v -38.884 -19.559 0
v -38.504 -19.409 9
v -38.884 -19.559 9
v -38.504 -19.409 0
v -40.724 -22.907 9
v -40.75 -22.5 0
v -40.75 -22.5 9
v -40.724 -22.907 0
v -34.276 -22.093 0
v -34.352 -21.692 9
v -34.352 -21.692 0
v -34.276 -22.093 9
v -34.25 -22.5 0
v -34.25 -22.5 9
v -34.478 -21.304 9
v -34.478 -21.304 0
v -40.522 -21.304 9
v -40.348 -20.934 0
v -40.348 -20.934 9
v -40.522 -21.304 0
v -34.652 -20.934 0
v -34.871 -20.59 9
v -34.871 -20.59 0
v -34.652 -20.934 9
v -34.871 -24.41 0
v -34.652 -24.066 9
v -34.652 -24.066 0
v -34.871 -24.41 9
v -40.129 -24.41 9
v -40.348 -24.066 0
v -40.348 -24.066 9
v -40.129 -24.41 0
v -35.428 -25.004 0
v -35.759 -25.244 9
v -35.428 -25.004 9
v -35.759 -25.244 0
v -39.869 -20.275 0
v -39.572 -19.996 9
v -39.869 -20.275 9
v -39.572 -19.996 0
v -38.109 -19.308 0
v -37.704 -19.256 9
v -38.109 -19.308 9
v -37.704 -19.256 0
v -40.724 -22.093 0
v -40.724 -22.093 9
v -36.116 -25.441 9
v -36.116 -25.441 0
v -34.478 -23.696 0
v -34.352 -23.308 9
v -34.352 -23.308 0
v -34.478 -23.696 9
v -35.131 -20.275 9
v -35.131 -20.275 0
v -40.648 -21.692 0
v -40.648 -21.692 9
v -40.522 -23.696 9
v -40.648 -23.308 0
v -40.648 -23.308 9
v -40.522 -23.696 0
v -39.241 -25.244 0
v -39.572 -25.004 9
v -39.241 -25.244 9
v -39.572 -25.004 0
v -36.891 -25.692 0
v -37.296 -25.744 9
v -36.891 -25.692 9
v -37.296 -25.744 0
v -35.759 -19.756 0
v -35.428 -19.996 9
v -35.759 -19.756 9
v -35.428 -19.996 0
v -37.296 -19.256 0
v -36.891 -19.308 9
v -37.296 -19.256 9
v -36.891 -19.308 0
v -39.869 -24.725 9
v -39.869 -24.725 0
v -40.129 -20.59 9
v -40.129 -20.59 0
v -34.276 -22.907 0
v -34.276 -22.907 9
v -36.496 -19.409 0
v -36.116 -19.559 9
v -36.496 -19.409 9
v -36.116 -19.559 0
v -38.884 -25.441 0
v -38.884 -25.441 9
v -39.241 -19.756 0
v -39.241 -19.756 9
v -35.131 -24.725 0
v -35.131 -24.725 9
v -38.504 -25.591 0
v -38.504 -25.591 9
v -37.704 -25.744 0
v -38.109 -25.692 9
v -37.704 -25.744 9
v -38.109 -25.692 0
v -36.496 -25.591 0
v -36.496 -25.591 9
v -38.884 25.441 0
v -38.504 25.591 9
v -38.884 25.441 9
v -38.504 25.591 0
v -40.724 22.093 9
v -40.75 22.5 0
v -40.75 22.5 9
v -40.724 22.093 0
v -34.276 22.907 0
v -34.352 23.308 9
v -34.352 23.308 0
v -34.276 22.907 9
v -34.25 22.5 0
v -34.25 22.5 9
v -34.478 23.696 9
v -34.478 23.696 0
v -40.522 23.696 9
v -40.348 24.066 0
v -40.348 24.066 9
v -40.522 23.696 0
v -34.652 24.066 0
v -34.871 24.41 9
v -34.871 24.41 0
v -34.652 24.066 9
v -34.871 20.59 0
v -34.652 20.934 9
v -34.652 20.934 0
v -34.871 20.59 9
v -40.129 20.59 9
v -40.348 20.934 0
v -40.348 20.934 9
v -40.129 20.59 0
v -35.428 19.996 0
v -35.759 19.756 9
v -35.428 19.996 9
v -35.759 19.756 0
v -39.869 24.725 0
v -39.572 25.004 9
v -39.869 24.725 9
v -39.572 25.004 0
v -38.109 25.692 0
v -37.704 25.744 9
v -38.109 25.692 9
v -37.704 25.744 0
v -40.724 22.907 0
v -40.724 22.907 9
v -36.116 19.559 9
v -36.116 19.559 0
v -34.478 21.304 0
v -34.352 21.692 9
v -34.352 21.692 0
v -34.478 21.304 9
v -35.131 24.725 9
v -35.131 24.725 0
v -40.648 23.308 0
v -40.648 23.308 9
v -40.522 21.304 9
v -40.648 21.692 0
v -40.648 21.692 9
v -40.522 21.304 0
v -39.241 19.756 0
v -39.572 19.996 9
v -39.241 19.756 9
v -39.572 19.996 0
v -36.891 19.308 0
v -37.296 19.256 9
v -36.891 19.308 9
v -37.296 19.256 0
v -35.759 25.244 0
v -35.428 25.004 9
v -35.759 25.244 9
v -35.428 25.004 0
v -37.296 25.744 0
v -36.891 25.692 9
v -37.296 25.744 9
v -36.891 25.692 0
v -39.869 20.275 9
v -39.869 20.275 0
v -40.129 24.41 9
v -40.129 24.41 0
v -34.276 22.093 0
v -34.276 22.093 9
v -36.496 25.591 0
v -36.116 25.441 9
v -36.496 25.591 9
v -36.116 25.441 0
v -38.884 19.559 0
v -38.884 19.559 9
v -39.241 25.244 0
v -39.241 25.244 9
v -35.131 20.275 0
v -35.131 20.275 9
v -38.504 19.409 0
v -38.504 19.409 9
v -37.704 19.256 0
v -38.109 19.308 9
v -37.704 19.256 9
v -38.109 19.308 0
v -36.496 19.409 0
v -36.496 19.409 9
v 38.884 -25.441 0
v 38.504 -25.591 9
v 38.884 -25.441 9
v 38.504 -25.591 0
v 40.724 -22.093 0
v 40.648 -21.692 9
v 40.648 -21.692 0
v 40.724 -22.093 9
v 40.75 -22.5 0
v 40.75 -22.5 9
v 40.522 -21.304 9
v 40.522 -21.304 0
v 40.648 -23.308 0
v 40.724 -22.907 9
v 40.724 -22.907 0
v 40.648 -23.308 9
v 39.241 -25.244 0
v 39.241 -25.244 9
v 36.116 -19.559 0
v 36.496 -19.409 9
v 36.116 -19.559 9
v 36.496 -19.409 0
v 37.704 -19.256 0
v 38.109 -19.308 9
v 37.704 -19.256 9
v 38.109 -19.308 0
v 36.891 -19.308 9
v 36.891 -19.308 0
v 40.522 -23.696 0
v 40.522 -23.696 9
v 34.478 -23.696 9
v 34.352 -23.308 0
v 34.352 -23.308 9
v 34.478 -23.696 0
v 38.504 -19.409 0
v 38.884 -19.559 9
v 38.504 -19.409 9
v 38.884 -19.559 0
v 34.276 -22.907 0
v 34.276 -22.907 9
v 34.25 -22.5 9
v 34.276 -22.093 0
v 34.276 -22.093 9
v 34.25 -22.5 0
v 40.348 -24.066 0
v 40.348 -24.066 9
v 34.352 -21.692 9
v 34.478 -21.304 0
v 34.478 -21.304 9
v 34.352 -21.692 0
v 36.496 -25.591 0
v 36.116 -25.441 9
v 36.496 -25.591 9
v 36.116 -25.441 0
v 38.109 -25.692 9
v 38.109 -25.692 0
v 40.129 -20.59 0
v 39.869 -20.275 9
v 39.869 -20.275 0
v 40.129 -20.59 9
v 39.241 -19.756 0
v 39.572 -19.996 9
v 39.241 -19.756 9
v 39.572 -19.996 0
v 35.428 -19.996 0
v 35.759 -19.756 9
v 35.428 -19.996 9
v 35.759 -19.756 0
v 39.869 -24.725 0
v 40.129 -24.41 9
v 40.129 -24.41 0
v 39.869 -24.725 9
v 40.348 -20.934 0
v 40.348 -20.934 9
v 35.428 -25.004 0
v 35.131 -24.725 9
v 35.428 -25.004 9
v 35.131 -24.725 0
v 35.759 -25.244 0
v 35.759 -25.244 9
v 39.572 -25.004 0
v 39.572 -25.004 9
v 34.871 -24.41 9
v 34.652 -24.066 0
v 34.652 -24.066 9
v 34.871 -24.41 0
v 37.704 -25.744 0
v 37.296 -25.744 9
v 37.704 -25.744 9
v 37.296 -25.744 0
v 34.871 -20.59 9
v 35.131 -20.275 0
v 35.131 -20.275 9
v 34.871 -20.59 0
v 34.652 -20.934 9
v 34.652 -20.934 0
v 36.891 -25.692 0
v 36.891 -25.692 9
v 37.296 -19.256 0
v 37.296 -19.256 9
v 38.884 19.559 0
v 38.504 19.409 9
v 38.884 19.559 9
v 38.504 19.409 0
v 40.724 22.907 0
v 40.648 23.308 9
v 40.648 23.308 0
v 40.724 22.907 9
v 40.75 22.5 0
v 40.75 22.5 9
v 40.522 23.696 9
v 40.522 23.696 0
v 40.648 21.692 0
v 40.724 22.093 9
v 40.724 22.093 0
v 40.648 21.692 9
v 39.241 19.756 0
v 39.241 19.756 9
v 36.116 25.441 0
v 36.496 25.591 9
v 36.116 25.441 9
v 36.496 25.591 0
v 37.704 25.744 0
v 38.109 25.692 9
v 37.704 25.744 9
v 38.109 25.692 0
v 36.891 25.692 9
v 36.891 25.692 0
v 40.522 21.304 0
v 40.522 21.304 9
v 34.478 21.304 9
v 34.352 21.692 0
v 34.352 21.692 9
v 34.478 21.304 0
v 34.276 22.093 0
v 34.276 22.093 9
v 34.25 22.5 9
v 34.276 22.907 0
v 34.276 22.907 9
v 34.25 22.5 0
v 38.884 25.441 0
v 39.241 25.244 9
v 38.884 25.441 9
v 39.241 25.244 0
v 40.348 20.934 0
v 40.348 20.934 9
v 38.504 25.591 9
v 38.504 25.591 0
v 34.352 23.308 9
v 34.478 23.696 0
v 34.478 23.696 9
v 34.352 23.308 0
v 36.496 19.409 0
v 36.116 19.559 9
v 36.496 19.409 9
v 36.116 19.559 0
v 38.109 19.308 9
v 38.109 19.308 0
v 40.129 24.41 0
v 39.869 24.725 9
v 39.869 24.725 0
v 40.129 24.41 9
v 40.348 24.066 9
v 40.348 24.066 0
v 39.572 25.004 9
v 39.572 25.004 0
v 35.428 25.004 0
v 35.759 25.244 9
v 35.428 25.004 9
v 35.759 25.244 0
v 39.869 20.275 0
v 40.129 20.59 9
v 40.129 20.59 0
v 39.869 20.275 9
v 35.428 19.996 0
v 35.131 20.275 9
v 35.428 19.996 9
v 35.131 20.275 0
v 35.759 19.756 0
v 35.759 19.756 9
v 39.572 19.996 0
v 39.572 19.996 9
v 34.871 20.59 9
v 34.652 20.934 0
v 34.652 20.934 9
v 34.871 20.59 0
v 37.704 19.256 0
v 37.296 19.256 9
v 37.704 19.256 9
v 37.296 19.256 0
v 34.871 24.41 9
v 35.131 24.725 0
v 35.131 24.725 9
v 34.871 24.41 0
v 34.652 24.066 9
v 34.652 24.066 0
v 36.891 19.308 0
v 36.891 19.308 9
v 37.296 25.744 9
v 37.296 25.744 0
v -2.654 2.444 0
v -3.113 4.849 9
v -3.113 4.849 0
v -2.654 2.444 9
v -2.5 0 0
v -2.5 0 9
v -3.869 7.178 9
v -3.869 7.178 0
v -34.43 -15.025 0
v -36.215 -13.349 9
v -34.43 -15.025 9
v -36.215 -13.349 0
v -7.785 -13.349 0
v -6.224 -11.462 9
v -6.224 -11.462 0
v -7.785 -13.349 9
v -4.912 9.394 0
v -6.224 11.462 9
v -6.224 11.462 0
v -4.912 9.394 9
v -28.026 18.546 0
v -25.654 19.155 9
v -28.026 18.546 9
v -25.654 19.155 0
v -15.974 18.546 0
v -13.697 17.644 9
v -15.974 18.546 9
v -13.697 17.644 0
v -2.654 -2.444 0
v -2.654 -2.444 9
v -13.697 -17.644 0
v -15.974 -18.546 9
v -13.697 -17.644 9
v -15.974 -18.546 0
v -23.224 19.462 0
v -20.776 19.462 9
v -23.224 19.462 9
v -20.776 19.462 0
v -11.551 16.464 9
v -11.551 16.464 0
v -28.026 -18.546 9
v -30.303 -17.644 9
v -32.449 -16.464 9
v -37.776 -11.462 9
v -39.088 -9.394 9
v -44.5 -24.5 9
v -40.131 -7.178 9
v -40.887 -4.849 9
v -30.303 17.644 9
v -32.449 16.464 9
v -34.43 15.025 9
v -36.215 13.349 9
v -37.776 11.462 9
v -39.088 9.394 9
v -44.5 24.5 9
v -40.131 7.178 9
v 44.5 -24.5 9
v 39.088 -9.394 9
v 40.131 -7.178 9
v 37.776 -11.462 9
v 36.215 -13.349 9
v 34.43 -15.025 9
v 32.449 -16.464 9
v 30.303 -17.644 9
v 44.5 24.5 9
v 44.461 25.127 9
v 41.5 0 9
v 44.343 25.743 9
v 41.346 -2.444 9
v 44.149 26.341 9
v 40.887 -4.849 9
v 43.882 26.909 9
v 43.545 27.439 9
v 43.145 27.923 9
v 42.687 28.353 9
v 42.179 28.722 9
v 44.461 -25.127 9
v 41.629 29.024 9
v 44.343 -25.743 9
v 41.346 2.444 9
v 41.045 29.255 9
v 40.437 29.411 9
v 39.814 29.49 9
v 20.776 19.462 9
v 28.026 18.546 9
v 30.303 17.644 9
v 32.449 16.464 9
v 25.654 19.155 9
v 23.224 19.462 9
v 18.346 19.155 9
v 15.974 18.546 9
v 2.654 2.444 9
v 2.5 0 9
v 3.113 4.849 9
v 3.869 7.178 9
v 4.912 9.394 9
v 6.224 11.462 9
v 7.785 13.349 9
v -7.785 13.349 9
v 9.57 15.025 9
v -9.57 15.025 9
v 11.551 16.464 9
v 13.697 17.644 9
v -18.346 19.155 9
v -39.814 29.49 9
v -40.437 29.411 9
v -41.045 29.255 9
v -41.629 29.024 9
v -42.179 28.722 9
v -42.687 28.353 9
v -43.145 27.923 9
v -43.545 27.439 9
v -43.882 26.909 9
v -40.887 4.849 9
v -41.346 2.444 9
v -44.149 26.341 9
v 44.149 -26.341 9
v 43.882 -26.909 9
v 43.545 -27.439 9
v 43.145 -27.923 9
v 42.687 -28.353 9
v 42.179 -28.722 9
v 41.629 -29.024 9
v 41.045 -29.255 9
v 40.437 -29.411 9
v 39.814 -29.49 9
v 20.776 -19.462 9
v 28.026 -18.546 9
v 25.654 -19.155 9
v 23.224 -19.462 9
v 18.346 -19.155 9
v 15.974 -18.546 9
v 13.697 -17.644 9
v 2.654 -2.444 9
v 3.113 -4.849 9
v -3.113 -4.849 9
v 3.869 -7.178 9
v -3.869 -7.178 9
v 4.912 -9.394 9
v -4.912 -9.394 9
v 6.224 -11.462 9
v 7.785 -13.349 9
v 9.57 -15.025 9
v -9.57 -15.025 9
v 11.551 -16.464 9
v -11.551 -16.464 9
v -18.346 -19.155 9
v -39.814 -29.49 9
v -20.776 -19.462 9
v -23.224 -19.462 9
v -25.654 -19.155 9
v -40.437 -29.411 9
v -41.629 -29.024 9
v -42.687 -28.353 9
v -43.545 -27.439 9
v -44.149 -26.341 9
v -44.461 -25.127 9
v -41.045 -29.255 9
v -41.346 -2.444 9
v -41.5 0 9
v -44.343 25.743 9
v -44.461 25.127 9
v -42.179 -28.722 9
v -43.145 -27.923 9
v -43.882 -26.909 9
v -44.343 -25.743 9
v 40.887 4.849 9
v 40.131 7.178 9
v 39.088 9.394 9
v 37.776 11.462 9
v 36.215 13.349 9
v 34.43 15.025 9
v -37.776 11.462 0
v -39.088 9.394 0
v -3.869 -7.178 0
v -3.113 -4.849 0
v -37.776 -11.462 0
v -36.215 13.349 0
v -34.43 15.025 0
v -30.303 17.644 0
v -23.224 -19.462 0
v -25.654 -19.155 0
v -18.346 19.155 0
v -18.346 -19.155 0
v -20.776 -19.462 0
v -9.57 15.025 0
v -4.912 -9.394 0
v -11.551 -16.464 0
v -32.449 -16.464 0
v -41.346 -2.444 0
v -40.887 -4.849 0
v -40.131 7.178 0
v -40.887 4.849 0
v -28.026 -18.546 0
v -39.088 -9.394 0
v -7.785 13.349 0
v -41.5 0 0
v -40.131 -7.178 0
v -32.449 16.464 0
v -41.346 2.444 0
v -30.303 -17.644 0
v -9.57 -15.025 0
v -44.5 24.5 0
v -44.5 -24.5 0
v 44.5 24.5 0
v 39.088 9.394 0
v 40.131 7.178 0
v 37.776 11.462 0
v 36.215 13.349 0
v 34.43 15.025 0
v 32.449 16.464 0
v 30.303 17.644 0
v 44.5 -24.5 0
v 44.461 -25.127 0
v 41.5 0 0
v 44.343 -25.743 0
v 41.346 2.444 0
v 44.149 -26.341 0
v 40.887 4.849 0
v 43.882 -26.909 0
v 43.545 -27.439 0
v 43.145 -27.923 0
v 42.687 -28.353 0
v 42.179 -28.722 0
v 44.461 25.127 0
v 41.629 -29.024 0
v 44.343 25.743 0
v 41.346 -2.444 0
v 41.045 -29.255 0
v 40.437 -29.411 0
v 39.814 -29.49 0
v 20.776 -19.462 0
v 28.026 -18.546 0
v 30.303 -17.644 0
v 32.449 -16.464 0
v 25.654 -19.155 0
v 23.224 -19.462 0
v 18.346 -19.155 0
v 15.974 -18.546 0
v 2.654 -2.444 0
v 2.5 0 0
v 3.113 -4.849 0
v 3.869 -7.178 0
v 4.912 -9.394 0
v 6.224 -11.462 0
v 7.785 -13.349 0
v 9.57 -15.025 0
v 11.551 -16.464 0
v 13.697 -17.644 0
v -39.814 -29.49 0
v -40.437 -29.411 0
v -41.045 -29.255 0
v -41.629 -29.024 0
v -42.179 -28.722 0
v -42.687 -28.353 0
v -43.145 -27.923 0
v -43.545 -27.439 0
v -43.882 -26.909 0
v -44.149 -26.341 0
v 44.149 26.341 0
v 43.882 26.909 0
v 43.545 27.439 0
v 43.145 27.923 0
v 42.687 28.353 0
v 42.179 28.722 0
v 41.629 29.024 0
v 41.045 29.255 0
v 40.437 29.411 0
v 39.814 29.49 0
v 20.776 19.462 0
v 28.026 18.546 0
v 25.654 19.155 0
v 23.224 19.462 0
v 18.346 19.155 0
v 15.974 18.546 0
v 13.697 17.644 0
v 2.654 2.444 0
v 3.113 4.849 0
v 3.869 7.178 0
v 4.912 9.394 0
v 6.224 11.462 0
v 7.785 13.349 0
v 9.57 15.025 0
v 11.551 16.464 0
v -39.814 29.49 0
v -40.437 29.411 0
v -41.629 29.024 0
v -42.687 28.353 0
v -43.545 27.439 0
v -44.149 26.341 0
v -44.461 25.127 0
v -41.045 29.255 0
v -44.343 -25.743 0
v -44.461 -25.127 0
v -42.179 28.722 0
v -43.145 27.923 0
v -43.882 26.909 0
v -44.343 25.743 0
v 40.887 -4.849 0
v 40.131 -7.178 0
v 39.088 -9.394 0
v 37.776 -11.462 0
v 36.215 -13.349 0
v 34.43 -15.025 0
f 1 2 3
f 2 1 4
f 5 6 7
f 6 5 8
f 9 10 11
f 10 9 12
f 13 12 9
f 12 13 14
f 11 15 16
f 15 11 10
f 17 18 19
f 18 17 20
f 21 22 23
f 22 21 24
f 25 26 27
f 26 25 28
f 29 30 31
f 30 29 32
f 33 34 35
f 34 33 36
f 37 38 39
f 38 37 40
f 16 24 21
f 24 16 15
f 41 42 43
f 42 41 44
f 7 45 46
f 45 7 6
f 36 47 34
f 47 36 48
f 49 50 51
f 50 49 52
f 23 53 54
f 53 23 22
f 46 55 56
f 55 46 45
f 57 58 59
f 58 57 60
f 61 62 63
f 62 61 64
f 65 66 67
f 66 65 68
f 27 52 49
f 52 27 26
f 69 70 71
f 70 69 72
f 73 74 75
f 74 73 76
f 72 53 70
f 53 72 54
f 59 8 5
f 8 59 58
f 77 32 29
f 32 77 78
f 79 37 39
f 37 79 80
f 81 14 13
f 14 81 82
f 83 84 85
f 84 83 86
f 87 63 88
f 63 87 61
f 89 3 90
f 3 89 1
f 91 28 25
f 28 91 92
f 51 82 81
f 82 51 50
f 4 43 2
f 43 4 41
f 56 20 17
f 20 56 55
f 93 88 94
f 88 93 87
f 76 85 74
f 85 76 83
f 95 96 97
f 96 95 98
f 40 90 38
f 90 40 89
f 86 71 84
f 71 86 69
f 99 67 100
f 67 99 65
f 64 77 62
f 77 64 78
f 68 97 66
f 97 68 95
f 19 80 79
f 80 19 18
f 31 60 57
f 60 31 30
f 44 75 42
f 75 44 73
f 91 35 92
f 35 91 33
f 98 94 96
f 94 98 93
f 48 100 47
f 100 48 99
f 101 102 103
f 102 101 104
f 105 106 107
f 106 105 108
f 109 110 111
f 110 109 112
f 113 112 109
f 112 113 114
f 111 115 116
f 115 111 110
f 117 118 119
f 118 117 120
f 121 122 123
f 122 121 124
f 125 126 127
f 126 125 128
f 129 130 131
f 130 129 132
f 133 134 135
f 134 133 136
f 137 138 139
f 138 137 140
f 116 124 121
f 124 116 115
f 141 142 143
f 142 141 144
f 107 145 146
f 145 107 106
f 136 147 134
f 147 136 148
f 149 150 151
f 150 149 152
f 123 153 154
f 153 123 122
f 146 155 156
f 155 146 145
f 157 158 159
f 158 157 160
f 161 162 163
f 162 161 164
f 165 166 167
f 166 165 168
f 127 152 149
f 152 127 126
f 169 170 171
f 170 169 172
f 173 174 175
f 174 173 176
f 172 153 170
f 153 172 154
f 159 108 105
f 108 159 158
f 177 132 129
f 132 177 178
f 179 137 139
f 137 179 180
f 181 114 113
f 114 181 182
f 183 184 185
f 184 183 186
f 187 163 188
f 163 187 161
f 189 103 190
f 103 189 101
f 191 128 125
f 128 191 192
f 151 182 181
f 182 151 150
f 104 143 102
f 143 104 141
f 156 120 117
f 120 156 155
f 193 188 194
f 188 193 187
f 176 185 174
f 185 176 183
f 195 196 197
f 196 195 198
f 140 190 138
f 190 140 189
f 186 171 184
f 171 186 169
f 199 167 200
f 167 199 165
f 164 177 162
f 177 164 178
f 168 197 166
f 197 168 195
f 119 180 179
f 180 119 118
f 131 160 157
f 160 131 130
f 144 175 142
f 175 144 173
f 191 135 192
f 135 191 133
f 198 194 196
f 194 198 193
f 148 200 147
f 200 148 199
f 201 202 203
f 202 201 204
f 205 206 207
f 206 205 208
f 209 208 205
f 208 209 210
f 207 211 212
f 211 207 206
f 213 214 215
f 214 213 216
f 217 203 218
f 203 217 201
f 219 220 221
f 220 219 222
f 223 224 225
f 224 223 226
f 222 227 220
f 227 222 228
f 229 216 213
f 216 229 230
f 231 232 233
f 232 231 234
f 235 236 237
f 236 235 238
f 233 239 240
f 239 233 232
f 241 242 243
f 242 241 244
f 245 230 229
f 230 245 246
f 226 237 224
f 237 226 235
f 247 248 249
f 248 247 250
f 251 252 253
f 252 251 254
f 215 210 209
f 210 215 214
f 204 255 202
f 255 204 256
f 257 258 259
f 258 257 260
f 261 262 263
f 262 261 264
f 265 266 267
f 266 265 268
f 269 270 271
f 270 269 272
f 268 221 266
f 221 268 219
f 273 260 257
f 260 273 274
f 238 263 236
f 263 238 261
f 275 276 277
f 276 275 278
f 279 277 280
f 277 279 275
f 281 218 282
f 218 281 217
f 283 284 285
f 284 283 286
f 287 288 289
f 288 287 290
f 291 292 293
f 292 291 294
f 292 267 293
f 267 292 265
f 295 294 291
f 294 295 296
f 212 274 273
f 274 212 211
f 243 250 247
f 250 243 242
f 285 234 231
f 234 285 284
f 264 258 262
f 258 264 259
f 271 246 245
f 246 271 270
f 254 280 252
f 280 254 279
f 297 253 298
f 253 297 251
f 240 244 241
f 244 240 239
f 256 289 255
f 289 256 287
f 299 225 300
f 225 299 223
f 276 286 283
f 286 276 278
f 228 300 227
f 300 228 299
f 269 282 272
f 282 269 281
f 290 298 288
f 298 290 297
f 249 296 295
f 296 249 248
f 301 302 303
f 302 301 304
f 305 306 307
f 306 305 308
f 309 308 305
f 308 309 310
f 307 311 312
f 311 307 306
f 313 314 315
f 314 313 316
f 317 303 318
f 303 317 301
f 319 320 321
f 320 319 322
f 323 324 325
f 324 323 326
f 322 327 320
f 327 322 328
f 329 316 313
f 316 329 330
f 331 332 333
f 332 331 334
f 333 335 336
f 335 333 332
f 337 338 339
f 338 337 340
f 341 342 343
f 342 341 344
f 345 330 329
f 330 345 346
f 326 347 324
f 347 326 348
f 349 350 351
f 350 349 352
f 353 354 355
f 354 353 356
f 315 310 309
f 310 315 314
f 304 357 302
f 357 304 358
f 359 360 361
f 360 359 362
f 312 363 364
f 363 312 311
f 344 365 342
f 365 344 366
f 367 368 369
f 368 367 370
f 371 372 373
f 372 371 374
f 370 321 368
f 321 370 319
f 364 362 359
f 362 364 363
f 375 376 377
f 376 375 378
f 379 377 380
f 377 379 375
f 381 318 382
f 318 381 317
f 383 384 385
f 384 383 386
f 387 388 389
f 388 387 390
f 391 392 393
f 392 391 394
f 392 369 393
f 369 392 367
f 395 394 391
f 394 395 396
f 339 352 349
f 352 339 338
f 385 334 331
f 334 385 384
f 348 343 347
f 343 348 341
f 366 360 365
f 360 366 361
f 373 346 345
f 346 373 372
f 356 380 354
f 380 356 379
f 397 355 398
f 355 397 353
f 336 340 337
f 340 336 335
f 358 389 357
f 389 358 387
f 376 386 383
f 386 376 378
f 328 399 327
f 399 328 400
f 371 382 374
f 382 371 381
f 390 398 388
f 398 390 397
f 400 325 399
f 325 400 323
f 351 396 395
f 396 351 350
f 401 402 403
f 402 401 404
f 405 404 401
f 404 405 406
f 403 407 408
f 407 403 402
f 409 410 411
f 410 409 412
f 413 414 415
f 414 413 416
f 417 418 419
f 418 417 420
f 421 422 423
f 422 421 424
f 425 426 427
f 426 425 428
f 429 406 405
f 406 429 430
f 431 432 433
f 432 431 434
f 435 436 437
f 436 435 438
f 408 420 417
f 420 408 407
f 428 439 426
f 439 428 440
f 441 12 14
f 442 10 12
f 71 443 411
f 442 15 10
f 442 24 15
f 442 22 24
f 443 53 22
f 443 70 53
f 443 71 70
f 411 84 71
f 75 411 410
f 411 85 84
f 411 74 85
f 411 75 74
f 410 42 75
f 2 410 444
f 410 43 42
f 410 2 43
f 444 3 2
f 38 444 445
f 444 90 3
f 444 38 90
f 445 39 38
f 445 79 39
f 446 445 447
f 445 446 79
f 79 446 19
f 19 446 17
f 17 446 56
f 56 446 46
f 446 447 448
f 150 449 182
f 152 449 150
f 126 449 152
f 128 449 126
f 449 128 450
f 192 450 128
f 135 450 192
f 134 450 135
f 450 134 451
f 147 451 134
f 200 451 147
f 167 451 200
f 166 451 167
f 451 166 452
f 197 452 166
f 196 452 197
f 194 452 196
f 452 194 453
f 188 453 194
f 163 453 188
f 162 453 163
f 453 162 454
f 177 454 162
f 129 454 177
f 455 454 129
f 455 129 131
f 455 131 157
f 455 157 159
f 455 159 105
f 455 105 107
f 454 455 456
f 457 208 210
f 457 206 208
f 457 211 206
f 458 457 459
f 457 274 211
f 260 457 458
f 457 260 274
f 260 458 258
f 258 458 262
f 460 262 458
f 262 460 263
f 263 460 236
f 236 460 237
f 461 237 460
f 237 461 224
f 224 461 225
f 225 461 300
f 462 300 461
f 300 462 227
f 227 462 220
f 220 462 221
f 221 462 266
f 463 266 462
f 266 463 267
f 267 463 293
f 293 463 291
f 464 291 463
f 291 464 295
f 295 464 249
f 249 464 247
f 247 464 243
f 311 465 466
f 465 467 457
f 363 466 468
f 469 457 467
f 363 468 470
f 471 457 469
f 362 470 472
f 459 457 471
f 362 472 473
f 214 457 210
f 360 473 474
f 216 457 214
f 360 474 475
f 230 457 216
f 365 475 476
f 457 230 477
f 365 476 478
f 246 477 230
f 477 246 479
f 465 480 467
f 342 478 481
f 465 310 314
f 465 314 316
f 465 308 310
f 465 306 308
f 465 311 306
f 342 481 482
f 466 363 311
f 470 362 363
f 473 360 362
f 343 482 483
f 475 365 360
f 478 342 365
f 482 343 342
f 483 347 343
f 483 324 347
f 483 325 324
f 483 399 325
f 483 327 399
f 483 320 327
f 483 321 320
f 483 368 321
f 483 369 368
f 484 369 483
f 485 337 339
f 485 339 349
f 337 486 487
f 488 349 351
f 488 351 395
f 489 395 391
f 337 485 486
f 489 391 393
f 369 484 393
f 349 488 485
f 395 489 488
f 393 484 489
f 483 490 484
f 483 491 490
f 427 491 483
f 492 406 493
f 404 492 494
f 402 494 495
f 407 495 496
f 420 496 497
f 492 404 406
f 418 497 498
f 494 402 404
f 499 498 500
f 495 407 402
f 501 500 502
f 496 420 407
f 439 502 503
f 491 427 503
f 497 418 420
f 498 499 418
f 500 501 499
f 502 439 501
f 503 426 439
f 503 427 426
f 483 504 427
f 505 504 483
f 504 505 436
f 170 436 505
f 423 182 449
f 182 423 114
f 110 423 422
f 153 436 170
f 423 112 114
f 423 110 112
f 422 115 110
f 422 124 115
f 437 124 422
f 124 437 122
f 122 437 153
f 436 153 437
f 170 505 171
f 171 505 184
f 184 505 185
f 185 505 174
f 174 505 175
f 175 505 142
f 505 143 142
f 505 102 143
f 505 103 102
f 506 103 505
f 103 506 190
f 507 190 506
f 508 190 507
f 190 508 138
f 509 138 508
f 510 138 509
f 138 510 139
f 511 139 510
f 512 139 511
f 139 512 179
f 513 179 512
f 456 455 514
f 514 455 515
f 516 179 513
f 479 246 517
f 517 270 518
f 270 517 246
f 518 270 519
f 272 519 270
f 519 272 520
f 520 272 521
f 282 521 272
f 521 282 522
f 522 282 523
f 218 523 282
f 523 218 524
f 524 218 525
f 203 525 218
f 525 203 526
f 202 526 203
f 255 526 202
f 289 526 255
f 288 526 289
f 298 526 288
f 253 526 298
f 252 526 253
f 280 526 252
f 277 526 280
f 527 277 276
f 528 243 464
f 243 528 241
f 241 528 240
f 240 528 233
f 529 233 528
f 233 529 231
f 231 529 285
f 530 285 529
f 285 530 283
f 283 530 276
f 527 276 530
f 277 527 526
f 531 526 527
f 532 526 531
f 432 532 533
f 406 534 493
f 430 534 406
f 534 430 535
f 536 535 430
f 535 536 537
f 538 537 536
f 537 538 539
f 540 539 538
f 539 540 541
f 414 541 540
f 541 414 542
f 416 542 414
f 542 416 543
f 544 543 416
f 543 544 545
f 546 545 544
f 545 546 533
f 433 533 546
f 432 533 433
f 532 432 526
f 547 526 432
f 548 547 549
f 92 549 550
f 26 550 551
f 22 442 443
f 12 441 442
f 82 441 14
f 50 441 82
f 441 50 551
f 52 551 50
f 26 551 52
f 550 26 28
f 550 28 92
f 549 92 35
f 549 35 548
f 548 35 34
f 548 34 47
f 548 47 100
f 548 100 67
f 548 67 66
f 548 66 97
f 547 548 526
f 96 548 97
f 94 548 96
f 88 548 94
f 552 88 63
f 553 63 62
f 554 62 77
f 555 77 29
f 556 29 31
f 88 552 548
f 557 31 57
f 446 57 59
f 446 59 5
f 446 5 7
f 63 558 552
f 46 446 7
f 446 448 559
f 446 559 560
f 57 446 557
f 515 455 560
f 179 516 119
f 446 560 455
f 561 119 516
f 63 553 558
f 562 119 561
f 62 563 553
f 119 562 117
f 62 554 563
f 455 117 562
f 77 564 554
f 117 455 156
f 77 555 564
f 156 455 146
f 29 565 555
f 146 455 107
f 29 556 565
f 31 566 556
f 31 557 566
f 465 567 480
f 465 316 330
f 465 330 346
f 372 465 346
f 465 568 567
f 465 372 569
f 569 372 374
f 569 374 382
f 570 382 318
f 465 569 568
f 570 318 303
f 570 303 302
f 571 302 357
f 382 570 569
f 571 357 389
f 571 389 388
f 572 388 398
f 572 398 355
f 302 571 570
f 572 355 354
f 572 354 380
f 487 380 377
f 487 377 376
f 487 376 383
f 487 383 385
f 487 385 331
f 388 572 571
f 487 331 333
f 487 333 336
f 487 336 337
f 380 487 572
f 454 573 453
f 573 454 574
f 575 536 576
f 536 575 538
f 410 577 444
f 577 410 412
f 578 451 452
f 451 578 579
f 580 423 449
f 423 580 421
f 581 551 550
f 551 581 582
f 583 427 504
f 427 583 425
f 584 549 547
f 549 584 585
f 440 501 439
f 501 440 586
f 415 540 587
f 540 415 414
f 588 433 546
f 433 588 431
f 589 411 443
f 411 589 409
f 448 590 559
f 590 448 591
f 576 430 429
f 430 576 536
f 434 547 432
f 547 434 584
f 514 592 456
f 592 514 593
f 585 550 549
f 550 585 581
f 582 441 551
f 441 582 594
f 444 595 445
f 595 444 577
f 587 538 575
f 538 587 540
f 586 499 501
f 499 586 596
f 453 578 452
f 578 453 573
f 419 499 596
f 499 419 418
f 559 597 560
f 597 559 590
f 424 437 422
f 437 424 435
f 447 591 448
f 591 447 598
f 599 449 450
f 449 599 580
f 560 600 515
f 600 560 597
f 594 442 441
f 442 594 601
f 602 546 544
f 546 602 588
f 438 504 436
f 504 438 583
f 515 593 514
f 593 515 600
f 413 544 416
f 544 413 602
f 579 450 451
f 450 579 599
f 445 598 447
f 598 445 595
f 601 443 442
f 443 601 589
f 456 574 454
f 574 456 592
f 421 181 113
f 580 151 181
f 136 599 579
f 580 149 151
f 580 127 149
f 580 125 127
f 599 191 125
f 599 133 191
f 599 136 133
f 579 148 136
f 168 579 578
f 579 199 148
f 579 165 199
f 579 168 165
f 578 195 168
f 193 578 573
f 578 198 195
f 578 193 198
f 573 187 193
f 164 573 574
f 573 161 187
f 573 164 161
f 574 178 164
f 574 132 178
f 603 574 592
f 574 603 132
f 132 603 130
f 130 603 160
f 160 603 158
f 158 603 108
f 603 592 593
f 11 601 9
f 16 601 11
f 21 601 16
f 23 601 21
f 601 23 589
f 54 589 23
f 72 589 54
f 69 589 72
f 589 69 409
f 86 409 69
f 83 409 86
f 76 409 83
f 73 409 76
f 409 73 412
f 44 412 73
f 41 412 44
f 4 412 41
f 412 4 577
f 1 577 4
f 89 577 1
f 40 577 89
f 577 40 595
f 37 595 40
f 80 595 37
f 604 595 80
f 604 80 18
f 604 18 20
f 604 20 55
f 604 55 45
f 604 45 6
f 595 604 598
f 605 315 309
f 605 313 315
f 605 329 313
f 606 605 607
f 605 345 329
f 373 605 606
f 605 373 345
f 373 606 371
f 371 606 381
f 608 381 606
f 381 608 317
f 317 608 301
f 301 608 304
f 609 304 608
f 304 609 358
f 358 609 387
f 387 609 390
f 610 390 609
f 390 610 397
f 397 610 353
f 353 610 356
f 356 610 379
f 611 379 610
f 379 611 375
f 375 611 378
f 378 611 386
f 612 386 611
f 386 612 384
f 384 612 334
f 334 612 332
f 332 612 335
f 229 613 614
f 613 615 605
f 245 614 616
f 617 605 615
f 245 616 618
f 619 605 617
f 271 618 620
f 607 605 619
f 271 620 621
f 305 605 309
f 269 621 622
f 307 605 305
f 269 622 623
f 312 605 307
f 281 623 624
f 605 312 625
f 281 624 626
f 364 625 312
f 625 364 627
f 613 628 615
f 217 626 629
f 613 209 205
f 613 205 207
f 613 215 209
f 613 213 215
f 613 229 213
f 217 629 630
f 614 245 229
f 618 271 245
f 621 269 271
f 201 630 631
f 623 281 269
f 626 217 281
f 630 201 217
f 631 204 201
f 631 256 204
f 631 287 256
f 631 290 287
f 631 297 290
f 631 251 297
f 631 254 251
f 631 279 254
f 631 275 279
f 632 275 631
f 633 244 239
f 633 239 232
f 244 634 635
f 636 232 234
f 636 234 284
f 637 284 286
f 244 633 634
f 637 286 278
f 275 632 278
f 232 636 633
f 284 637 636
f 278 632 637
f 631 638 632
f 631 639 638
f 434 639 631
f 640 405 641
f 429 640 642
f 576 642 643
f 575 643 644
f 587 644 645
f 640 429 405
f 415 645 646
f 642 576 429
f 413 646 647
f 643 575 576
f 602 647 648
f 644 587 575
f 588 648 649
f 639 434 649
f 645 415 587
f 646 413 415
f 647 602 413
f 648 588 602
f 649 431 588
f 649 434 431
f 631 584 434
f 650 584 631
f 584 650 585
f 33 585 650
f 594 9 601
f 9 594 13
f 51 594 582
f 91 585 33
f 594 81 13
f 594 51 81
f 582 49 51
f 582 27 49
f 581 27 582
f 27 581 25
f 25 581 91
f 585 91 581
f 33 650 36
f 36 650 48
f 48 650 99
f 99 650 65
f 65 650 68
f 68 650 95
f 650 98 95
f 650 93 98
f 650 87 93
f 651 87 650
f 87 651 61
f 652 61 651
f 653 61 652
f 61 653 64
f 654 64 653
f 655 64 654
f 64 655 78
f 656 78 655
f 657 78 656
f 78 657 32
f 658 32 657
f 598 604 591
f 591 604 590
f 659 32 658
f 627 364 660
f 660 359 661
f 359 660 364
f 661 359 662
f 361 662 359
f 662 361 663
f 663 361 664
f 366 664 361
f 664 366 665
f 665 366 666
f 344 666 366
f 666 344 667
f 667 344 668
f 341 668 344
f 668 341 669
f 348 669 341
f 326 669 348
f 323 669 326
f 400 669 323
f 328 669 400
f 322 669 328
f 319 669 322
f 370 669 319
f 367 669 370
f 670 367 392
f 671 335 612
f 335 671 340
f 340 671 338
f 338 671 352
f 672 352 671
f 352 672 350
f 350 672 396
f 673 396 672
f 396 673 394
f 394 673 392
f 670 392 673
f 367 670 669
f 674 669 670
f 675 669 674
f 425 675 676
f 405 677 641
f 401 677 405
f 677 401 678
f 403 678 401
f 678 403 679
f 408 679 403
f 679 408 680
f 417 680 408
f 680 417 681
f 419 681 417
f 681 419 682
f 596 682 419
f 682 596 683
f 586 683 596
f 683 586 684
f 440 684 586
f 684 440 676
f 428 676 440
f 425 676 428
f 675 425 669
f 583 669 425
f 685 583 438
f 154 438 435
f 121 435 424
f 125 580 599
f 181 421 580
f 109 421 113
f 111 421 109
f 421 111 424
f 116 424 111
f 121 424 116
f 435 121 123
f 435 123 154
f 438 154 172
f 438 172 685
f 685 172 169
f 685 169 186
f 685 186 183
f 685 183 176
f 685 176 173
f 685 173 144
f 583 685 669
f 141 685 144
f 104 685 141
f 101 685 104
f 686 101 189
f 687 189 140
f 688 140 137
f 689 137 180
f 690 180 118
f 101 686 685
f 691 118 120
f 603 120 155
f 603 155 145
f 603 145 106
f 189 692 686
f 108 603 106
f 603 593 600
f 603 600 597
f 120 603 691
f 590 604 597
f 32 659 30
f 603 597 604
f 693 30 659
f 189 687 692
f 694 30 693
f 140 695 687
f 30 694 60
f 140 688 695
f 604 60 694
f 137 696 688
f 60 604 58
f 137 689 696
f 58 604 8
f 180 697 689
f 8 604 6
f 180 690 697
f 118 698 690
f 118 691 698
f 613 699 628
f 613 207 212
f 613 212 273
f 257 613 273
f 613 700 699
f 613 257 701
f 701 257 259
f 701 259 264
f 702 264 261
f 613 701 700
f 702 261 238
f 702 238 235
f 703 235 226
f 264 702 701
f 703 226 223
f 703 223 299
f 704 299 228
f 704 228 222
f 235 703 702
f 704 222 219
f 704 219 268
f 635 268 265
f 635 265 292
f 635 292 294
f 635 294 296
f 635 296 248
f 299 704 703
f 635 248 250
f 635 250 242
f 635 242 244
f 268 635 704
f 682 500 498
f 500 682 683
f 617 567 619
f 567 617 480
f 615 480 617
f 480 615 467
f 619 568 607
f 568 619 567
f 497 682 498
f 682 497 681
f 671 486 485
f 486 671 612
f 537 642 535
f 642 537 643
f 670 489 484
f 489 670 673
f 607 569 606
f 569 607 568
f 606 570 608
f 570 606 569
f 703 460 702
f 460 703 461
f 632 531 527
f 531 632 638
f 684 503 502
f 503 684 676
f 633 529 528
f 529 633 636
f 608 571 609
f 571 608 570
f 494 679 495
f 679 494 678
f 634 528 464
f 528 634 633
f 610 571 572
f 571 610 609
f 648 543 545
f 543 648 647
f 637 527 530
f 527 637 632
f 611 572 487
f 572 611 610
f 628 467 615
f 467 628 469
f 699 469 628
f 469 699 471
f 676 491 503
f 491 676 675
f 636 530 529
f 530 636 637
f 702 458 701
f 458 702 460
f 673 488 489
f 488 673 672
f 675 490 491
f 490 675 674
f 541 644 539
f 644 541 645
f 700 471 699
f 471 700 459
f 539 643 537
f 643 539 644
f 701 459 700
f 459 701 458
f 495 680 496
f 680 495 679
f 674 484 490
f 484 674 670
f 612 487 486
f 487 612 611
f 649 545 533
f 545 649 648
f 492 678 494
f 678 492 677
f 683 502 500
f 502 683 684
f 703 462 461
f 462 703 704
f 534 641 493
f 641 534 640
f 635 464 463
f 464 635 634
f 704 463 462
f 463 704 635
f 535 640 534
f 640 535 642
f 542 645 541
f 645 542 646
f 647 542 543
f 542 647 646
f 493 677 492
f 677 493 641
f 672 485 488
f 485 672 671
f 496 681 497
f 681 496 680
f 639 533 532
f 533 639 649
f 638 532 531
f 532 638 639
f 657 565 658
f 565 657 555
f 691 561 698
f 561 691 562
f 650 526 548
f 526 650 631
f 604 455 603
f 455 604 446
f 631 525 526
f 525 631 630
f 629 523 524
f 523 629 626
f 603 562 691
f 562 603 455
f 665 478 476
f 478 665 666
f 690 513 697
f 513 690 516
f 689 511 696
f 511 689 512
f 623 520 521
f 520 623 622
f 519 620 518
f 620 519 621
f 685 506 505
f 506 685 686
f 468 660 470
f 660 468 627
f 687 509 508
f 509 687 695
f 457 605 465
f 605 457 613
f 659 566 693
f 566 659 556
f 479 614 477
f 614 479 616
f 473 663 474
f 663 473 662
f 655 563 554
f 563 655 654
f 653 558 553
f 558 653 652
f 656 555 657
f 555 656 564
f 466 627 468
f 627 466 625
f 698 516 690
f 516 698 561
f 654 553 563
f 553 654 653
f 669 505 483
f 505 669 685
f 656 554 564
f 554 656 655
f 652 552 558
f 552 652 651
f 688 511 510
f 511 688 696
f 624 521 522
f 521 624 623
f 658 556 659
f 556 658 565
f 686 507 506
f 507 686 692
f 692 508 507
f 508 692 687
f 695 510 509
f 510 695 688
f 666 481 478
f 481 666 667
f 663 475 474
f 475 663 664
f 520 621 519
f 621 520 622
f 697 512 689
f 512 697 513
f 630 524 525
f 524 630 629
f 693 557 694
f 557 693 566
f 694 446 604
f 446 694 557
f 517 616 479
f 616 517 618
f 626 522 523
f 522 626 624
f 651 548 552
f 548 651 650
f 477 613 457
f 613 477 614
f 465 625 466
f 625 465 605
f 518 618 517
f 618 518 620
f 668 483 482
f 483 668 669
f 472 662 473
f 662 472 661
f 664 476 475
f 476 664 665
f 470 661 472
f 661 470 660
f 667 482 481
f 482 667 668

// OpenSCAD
$fn = 50;


difference() {
	union() {
		hull() {
			translate(v = [-39.5000000000, 24.5000000000, 0]) {
				cylinder(h = 9, r = 5);
			}
			translate(v = [39.5000000000, 24.5000000000, 0]) {
				cylinder(h = 9, r = 5);
			}
			translate(v = [-39.5000000000, -24.5000000000, 0]) {
				cylinder(h = 9, r = 5);
			}
			translate(v = [39.5000000000, -24.5000000000, 0]) {
				cylinder(h = 9, r = 5);
			}
		}
	}
	union() {
		#translate(v = [-37.5000000000, -22.5000000000, -100.0000000000]) {
			cylinder(h = 200, r = 3.2500000000);
		}
		#translate(v = [-37.5000000000, 22.5000000000, -100.0000000000]) {
			cylinder(h = 200, r = 3.2500000000);
		}
		#translate(v = [37.5000000000, -22.5000000000, -100.0000000000]) {
			cylinder(h = 200, r = 3.2500000000);
		}
		#translate(v = [37.5000000000, 22.5000000000, -100.0000000000]) {
			cylinder(h = 200, r = 3.2500000000);
		}
		#translate(v = [-22.0000000000, 0, 0]) {
			cylinder(h = 9, r = 19.5000000000);
		}
		#translate(v = [22.0000000000, 0, 0]) {
			cylinder(h = 9, r = 19.5000000000);
		}
	}
}
